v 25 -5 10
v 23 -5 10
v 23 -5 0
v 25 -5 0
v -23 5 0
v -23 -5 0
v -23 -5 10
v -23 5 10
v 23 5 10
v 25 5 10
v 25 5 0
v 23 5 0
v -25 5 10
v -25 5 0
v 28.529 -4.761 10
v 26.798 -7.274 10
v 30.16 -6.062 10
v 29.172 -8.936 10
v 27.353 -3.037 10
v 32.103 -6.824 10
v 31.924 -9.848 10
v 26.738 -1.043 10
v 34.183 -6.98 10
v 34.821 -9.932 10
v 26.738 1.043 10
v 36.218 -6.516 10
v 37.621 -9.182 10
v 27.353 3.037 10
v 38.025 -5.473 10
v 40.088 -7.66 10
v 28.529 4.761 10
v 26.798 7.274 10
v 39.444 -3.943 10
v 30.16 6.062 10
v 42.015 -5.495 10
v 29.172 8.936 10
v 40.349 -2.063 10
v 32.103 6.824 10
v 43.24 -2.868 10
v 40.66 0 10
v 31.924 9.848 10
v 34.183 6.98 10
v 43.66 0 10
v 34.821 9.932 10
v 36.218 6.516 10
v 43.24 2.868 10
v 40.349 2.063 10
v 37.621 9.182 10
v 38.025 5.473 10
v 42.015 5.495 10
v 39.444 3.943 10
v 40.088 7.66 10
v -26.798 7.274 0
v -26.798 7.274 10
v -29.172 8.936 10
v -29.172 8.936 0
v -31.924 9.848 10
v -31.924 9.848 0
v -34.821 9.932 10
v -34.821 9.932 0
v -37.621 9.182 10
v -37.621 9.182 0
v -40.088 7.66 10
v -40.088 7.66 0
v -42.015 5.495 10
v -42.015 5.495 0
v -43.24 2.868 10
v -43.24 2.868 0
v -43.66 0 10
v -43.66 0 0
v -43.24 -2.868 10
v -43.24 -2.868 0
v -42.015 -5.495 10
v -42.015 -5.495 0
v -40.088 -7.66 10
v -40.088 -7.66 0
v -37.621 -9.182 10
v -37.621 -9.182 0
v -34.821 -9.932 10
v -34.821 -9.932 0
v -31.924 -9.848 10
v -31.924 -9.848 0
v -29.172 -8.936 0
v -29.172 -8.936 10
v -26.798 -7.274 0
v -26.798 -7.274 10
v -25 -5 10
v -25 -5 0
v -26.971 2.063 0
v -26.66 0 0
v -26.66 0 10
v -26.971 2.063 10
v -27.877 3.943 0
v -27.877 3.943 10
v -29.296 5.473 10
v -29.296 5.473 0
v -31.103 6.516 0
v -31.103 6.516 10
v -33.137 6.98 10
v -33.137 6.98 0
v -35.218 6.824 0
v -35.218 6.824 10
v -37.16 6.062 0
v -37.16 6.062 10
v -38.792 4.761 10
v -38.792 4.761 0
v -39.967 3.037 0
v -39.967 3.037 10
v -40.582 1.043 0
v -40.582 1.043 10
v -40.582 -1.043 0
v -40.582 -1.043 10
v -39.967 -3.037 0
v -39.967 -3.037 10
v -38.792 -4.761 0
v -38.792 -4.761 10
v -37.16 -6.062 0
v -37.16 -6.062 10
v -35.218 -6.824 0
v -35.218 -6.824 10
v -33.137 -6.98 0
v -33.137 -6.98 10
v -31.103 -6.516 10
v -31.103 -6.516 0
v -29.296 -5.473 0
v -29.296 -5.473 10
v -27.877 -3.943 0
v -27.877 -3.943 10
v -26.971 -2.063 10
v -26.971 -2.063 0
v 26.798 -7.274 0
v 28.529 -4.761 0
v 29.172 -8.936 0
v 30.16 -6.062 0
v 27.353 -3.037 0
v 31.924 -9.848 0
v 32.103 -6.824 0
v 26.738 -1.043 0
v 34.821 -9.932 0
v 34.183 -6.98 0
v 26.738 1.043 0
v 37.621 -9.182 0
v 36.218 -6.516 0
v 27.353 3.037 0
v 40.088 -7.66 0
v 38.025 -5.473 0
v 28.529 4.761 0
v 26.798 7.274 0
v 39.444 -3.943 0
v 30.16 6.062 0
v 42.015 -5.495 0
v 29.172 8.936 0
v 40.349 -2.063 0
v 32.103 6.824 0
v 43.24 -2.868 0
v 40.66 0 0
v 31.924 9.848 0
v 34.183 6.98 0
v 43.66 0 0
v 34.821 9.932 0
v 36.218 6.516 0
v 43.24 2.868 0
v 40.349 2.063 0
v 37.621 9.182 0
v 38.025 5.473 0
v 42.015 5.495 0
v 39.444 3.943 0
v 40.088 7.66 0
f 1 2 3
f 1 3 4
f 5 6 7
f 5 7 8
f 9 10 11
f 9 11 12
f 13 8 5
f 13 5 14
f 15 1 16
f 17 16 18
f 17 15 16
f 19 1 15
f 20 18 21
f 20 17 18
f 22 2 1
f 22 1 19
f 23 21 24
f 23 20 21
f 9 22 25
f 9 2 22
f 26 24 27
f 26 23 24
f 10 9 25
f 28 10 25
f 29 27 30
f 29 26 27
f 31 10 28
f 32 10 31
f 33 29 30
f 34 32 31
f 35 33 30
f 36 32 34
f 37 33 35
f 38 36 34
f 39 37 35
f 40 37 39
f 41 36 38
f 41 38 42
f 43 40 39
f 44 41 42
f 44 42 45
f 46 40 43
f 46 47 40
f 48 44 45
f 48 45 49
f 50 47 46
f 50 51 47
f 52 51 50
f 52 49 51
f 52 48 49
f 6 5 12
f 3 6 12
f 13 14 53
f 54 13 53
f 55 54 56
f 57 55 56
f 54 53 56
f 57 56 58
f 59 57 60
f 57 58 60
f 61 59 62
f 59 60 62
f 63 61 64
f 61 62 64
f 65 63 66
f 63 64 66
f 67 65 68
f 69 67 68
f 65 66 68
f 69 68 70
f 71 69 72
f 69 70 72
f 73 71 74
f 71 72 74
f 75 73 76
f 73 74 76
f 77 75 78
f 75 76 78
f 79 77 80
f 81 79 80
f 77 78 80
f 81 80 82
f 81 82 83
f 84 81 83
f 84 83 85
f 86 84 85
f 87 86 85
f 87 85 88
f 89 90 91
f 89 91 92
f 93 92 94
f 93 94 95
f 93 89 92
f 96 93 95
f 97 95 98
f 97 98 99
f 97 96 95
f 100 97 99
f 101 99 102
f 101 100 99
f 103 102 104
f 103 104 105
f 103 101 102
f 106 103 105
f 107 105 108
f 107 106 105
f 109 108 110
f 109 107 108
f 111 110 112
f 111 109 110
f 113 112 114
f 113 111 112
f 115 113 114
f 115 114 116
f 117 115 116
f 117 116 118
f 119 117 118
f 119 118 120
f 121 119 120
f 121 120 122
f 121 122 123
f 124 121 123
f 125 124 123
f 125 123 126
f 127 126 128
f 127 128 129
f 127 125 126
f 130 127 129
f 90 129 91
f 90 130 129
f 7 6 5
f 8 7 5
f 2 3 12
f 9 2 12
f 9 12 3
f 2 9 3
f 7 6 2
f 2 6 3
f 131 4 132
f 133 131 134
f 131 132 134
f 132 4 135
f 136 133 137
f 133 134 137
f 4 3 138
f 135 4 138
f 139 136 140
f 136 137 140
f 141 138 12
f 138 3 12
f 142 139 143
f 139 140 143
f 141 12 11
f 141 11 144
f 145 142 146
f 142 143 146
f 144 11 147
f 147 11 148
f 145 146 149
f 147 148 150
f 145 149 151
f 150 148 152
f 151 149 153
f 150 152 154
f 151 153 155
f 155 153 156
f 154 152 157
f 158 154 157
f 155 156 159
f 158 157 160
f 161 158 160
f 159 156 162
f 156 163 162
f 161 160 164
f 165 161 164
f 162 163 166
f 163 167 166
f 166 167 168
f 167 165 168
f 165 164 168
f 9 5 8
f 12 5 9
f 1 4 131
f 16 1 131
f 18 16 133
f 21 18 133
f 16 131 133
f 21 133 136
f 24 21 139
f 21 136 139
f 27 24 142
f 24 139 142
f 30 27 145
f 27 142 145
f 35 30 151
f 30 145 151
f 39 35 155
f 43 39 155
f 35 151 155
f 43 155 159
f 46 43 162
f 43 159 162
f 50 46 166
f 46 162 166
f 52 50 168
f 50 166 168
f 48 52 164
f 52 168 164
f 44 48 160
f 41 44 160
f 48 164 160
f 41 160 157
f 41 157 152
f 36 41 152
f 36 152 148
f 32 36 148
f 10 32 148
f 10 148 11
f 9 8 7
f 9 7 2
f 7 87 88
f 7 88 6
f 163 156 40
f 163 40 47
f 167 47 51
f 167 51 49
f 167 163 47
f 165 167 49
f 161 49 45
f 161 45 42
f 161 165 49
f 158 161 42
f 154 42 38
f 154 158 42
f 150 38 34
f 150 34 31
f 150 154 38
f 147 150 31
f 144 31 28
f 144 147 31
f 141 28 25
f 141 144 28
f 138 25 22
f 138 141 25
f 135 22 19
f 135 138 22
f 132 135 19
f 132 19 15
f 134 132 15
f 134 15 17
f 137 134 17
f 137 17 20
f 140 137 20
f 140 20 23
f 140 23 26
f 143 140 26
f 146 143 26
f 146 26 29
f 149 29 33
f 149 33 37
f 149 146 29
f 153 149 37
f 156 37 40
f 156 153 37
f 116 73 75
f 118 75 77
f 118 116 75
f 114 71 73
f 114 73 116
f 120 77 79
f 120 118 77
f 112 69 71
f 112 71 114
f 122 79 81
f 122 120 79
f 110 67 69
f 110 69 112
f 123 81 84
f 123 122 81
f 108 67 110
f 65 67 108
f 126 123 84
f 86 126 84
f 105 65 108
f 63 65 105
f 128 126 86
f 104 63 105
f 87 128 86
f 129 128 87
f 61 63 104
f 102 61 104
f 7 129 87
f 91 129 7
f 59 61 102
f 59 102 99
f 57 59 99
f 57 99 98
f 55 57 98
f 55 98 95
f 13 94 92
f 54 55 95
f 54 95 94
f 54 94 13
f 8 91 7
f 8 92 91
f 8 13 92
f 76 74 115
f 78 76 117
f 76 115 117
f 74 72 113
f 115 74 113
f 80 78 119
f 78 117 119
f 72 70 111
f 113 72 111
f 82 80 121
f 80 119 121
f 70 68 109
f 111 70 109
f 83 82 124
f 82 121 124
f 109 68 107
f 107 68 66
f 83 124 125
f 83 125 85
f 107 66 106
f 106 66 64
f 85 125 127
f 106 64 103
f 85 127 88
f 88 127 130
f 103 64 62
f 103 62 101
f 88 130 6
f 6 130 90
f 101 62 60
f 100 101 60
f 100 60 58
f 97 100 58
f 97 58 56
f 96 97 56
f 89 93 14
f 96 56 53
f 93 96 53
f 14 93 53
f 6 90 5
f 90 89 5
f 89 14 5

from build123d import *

# Parameters (mm, degrees)
SKETCH1_R             = 7
BOSS_EXTRUDE1_DEPTH   = 10
BOSS_EXTRUDE1_2_DEPTH = 10
SKETCH1_3_W           = 46
SKETCH1_3_H           = 10
BOSS_EXTRUDE2_DEPTH   = 10


with BuildPart() as part:
    # Sketch1 → Boss-Extrude1 (new body)
    with BuildSketch(Plane.XY):
        with BuildLine():
            Line((-23, 5), (-25, 5))
            ThreePointArc((-25, 5), (-43.660254038, 0), (-25, -5))
            Line((-25, -5), (-23, -5))
            Line((-23, -5), (-23, 5))
        make_face()
        with Locations((-33.660254038, 0)):
            Circle(SKETCH1_R, mode=Mode.SUBTRACT)
    extrude(amount=BOSS_EXTRUDE1_DEPTH)


with BuildPart() as body_2:
    # Sketch1 → Boss-Extrude1 2 (new body)
    with BuildSketch(Plane.XY):
        with BuildLine():
            Line((25, 5), (23, 5))
            Line((23, 5), (23, -5))
            Line((23, -5), (25, -5))
            ThreePointArc((25, -5), (43.660254038, 0), (25, 5))
        make_face()
        with Locations((33.660254038, 0)):
            Circle(SKETCH1_R, mode=Mode.SUBTRACT)
    extrude(amount=BOSS_EXTRUDE1_2_DEPTH)


with BuildPart() as body_3:
    # Sketch1_3 → Boss-Extrude2 (new body)
    with BuildSketch(Plane.XY):
        Rectangle(SKETCH1_3_W, SKETCH1_3_H)
    extrude(amount=BOSS_EXTRUDE2_DEPTH)


solid = Compound([part.part, body_2.part, body_3.part])
